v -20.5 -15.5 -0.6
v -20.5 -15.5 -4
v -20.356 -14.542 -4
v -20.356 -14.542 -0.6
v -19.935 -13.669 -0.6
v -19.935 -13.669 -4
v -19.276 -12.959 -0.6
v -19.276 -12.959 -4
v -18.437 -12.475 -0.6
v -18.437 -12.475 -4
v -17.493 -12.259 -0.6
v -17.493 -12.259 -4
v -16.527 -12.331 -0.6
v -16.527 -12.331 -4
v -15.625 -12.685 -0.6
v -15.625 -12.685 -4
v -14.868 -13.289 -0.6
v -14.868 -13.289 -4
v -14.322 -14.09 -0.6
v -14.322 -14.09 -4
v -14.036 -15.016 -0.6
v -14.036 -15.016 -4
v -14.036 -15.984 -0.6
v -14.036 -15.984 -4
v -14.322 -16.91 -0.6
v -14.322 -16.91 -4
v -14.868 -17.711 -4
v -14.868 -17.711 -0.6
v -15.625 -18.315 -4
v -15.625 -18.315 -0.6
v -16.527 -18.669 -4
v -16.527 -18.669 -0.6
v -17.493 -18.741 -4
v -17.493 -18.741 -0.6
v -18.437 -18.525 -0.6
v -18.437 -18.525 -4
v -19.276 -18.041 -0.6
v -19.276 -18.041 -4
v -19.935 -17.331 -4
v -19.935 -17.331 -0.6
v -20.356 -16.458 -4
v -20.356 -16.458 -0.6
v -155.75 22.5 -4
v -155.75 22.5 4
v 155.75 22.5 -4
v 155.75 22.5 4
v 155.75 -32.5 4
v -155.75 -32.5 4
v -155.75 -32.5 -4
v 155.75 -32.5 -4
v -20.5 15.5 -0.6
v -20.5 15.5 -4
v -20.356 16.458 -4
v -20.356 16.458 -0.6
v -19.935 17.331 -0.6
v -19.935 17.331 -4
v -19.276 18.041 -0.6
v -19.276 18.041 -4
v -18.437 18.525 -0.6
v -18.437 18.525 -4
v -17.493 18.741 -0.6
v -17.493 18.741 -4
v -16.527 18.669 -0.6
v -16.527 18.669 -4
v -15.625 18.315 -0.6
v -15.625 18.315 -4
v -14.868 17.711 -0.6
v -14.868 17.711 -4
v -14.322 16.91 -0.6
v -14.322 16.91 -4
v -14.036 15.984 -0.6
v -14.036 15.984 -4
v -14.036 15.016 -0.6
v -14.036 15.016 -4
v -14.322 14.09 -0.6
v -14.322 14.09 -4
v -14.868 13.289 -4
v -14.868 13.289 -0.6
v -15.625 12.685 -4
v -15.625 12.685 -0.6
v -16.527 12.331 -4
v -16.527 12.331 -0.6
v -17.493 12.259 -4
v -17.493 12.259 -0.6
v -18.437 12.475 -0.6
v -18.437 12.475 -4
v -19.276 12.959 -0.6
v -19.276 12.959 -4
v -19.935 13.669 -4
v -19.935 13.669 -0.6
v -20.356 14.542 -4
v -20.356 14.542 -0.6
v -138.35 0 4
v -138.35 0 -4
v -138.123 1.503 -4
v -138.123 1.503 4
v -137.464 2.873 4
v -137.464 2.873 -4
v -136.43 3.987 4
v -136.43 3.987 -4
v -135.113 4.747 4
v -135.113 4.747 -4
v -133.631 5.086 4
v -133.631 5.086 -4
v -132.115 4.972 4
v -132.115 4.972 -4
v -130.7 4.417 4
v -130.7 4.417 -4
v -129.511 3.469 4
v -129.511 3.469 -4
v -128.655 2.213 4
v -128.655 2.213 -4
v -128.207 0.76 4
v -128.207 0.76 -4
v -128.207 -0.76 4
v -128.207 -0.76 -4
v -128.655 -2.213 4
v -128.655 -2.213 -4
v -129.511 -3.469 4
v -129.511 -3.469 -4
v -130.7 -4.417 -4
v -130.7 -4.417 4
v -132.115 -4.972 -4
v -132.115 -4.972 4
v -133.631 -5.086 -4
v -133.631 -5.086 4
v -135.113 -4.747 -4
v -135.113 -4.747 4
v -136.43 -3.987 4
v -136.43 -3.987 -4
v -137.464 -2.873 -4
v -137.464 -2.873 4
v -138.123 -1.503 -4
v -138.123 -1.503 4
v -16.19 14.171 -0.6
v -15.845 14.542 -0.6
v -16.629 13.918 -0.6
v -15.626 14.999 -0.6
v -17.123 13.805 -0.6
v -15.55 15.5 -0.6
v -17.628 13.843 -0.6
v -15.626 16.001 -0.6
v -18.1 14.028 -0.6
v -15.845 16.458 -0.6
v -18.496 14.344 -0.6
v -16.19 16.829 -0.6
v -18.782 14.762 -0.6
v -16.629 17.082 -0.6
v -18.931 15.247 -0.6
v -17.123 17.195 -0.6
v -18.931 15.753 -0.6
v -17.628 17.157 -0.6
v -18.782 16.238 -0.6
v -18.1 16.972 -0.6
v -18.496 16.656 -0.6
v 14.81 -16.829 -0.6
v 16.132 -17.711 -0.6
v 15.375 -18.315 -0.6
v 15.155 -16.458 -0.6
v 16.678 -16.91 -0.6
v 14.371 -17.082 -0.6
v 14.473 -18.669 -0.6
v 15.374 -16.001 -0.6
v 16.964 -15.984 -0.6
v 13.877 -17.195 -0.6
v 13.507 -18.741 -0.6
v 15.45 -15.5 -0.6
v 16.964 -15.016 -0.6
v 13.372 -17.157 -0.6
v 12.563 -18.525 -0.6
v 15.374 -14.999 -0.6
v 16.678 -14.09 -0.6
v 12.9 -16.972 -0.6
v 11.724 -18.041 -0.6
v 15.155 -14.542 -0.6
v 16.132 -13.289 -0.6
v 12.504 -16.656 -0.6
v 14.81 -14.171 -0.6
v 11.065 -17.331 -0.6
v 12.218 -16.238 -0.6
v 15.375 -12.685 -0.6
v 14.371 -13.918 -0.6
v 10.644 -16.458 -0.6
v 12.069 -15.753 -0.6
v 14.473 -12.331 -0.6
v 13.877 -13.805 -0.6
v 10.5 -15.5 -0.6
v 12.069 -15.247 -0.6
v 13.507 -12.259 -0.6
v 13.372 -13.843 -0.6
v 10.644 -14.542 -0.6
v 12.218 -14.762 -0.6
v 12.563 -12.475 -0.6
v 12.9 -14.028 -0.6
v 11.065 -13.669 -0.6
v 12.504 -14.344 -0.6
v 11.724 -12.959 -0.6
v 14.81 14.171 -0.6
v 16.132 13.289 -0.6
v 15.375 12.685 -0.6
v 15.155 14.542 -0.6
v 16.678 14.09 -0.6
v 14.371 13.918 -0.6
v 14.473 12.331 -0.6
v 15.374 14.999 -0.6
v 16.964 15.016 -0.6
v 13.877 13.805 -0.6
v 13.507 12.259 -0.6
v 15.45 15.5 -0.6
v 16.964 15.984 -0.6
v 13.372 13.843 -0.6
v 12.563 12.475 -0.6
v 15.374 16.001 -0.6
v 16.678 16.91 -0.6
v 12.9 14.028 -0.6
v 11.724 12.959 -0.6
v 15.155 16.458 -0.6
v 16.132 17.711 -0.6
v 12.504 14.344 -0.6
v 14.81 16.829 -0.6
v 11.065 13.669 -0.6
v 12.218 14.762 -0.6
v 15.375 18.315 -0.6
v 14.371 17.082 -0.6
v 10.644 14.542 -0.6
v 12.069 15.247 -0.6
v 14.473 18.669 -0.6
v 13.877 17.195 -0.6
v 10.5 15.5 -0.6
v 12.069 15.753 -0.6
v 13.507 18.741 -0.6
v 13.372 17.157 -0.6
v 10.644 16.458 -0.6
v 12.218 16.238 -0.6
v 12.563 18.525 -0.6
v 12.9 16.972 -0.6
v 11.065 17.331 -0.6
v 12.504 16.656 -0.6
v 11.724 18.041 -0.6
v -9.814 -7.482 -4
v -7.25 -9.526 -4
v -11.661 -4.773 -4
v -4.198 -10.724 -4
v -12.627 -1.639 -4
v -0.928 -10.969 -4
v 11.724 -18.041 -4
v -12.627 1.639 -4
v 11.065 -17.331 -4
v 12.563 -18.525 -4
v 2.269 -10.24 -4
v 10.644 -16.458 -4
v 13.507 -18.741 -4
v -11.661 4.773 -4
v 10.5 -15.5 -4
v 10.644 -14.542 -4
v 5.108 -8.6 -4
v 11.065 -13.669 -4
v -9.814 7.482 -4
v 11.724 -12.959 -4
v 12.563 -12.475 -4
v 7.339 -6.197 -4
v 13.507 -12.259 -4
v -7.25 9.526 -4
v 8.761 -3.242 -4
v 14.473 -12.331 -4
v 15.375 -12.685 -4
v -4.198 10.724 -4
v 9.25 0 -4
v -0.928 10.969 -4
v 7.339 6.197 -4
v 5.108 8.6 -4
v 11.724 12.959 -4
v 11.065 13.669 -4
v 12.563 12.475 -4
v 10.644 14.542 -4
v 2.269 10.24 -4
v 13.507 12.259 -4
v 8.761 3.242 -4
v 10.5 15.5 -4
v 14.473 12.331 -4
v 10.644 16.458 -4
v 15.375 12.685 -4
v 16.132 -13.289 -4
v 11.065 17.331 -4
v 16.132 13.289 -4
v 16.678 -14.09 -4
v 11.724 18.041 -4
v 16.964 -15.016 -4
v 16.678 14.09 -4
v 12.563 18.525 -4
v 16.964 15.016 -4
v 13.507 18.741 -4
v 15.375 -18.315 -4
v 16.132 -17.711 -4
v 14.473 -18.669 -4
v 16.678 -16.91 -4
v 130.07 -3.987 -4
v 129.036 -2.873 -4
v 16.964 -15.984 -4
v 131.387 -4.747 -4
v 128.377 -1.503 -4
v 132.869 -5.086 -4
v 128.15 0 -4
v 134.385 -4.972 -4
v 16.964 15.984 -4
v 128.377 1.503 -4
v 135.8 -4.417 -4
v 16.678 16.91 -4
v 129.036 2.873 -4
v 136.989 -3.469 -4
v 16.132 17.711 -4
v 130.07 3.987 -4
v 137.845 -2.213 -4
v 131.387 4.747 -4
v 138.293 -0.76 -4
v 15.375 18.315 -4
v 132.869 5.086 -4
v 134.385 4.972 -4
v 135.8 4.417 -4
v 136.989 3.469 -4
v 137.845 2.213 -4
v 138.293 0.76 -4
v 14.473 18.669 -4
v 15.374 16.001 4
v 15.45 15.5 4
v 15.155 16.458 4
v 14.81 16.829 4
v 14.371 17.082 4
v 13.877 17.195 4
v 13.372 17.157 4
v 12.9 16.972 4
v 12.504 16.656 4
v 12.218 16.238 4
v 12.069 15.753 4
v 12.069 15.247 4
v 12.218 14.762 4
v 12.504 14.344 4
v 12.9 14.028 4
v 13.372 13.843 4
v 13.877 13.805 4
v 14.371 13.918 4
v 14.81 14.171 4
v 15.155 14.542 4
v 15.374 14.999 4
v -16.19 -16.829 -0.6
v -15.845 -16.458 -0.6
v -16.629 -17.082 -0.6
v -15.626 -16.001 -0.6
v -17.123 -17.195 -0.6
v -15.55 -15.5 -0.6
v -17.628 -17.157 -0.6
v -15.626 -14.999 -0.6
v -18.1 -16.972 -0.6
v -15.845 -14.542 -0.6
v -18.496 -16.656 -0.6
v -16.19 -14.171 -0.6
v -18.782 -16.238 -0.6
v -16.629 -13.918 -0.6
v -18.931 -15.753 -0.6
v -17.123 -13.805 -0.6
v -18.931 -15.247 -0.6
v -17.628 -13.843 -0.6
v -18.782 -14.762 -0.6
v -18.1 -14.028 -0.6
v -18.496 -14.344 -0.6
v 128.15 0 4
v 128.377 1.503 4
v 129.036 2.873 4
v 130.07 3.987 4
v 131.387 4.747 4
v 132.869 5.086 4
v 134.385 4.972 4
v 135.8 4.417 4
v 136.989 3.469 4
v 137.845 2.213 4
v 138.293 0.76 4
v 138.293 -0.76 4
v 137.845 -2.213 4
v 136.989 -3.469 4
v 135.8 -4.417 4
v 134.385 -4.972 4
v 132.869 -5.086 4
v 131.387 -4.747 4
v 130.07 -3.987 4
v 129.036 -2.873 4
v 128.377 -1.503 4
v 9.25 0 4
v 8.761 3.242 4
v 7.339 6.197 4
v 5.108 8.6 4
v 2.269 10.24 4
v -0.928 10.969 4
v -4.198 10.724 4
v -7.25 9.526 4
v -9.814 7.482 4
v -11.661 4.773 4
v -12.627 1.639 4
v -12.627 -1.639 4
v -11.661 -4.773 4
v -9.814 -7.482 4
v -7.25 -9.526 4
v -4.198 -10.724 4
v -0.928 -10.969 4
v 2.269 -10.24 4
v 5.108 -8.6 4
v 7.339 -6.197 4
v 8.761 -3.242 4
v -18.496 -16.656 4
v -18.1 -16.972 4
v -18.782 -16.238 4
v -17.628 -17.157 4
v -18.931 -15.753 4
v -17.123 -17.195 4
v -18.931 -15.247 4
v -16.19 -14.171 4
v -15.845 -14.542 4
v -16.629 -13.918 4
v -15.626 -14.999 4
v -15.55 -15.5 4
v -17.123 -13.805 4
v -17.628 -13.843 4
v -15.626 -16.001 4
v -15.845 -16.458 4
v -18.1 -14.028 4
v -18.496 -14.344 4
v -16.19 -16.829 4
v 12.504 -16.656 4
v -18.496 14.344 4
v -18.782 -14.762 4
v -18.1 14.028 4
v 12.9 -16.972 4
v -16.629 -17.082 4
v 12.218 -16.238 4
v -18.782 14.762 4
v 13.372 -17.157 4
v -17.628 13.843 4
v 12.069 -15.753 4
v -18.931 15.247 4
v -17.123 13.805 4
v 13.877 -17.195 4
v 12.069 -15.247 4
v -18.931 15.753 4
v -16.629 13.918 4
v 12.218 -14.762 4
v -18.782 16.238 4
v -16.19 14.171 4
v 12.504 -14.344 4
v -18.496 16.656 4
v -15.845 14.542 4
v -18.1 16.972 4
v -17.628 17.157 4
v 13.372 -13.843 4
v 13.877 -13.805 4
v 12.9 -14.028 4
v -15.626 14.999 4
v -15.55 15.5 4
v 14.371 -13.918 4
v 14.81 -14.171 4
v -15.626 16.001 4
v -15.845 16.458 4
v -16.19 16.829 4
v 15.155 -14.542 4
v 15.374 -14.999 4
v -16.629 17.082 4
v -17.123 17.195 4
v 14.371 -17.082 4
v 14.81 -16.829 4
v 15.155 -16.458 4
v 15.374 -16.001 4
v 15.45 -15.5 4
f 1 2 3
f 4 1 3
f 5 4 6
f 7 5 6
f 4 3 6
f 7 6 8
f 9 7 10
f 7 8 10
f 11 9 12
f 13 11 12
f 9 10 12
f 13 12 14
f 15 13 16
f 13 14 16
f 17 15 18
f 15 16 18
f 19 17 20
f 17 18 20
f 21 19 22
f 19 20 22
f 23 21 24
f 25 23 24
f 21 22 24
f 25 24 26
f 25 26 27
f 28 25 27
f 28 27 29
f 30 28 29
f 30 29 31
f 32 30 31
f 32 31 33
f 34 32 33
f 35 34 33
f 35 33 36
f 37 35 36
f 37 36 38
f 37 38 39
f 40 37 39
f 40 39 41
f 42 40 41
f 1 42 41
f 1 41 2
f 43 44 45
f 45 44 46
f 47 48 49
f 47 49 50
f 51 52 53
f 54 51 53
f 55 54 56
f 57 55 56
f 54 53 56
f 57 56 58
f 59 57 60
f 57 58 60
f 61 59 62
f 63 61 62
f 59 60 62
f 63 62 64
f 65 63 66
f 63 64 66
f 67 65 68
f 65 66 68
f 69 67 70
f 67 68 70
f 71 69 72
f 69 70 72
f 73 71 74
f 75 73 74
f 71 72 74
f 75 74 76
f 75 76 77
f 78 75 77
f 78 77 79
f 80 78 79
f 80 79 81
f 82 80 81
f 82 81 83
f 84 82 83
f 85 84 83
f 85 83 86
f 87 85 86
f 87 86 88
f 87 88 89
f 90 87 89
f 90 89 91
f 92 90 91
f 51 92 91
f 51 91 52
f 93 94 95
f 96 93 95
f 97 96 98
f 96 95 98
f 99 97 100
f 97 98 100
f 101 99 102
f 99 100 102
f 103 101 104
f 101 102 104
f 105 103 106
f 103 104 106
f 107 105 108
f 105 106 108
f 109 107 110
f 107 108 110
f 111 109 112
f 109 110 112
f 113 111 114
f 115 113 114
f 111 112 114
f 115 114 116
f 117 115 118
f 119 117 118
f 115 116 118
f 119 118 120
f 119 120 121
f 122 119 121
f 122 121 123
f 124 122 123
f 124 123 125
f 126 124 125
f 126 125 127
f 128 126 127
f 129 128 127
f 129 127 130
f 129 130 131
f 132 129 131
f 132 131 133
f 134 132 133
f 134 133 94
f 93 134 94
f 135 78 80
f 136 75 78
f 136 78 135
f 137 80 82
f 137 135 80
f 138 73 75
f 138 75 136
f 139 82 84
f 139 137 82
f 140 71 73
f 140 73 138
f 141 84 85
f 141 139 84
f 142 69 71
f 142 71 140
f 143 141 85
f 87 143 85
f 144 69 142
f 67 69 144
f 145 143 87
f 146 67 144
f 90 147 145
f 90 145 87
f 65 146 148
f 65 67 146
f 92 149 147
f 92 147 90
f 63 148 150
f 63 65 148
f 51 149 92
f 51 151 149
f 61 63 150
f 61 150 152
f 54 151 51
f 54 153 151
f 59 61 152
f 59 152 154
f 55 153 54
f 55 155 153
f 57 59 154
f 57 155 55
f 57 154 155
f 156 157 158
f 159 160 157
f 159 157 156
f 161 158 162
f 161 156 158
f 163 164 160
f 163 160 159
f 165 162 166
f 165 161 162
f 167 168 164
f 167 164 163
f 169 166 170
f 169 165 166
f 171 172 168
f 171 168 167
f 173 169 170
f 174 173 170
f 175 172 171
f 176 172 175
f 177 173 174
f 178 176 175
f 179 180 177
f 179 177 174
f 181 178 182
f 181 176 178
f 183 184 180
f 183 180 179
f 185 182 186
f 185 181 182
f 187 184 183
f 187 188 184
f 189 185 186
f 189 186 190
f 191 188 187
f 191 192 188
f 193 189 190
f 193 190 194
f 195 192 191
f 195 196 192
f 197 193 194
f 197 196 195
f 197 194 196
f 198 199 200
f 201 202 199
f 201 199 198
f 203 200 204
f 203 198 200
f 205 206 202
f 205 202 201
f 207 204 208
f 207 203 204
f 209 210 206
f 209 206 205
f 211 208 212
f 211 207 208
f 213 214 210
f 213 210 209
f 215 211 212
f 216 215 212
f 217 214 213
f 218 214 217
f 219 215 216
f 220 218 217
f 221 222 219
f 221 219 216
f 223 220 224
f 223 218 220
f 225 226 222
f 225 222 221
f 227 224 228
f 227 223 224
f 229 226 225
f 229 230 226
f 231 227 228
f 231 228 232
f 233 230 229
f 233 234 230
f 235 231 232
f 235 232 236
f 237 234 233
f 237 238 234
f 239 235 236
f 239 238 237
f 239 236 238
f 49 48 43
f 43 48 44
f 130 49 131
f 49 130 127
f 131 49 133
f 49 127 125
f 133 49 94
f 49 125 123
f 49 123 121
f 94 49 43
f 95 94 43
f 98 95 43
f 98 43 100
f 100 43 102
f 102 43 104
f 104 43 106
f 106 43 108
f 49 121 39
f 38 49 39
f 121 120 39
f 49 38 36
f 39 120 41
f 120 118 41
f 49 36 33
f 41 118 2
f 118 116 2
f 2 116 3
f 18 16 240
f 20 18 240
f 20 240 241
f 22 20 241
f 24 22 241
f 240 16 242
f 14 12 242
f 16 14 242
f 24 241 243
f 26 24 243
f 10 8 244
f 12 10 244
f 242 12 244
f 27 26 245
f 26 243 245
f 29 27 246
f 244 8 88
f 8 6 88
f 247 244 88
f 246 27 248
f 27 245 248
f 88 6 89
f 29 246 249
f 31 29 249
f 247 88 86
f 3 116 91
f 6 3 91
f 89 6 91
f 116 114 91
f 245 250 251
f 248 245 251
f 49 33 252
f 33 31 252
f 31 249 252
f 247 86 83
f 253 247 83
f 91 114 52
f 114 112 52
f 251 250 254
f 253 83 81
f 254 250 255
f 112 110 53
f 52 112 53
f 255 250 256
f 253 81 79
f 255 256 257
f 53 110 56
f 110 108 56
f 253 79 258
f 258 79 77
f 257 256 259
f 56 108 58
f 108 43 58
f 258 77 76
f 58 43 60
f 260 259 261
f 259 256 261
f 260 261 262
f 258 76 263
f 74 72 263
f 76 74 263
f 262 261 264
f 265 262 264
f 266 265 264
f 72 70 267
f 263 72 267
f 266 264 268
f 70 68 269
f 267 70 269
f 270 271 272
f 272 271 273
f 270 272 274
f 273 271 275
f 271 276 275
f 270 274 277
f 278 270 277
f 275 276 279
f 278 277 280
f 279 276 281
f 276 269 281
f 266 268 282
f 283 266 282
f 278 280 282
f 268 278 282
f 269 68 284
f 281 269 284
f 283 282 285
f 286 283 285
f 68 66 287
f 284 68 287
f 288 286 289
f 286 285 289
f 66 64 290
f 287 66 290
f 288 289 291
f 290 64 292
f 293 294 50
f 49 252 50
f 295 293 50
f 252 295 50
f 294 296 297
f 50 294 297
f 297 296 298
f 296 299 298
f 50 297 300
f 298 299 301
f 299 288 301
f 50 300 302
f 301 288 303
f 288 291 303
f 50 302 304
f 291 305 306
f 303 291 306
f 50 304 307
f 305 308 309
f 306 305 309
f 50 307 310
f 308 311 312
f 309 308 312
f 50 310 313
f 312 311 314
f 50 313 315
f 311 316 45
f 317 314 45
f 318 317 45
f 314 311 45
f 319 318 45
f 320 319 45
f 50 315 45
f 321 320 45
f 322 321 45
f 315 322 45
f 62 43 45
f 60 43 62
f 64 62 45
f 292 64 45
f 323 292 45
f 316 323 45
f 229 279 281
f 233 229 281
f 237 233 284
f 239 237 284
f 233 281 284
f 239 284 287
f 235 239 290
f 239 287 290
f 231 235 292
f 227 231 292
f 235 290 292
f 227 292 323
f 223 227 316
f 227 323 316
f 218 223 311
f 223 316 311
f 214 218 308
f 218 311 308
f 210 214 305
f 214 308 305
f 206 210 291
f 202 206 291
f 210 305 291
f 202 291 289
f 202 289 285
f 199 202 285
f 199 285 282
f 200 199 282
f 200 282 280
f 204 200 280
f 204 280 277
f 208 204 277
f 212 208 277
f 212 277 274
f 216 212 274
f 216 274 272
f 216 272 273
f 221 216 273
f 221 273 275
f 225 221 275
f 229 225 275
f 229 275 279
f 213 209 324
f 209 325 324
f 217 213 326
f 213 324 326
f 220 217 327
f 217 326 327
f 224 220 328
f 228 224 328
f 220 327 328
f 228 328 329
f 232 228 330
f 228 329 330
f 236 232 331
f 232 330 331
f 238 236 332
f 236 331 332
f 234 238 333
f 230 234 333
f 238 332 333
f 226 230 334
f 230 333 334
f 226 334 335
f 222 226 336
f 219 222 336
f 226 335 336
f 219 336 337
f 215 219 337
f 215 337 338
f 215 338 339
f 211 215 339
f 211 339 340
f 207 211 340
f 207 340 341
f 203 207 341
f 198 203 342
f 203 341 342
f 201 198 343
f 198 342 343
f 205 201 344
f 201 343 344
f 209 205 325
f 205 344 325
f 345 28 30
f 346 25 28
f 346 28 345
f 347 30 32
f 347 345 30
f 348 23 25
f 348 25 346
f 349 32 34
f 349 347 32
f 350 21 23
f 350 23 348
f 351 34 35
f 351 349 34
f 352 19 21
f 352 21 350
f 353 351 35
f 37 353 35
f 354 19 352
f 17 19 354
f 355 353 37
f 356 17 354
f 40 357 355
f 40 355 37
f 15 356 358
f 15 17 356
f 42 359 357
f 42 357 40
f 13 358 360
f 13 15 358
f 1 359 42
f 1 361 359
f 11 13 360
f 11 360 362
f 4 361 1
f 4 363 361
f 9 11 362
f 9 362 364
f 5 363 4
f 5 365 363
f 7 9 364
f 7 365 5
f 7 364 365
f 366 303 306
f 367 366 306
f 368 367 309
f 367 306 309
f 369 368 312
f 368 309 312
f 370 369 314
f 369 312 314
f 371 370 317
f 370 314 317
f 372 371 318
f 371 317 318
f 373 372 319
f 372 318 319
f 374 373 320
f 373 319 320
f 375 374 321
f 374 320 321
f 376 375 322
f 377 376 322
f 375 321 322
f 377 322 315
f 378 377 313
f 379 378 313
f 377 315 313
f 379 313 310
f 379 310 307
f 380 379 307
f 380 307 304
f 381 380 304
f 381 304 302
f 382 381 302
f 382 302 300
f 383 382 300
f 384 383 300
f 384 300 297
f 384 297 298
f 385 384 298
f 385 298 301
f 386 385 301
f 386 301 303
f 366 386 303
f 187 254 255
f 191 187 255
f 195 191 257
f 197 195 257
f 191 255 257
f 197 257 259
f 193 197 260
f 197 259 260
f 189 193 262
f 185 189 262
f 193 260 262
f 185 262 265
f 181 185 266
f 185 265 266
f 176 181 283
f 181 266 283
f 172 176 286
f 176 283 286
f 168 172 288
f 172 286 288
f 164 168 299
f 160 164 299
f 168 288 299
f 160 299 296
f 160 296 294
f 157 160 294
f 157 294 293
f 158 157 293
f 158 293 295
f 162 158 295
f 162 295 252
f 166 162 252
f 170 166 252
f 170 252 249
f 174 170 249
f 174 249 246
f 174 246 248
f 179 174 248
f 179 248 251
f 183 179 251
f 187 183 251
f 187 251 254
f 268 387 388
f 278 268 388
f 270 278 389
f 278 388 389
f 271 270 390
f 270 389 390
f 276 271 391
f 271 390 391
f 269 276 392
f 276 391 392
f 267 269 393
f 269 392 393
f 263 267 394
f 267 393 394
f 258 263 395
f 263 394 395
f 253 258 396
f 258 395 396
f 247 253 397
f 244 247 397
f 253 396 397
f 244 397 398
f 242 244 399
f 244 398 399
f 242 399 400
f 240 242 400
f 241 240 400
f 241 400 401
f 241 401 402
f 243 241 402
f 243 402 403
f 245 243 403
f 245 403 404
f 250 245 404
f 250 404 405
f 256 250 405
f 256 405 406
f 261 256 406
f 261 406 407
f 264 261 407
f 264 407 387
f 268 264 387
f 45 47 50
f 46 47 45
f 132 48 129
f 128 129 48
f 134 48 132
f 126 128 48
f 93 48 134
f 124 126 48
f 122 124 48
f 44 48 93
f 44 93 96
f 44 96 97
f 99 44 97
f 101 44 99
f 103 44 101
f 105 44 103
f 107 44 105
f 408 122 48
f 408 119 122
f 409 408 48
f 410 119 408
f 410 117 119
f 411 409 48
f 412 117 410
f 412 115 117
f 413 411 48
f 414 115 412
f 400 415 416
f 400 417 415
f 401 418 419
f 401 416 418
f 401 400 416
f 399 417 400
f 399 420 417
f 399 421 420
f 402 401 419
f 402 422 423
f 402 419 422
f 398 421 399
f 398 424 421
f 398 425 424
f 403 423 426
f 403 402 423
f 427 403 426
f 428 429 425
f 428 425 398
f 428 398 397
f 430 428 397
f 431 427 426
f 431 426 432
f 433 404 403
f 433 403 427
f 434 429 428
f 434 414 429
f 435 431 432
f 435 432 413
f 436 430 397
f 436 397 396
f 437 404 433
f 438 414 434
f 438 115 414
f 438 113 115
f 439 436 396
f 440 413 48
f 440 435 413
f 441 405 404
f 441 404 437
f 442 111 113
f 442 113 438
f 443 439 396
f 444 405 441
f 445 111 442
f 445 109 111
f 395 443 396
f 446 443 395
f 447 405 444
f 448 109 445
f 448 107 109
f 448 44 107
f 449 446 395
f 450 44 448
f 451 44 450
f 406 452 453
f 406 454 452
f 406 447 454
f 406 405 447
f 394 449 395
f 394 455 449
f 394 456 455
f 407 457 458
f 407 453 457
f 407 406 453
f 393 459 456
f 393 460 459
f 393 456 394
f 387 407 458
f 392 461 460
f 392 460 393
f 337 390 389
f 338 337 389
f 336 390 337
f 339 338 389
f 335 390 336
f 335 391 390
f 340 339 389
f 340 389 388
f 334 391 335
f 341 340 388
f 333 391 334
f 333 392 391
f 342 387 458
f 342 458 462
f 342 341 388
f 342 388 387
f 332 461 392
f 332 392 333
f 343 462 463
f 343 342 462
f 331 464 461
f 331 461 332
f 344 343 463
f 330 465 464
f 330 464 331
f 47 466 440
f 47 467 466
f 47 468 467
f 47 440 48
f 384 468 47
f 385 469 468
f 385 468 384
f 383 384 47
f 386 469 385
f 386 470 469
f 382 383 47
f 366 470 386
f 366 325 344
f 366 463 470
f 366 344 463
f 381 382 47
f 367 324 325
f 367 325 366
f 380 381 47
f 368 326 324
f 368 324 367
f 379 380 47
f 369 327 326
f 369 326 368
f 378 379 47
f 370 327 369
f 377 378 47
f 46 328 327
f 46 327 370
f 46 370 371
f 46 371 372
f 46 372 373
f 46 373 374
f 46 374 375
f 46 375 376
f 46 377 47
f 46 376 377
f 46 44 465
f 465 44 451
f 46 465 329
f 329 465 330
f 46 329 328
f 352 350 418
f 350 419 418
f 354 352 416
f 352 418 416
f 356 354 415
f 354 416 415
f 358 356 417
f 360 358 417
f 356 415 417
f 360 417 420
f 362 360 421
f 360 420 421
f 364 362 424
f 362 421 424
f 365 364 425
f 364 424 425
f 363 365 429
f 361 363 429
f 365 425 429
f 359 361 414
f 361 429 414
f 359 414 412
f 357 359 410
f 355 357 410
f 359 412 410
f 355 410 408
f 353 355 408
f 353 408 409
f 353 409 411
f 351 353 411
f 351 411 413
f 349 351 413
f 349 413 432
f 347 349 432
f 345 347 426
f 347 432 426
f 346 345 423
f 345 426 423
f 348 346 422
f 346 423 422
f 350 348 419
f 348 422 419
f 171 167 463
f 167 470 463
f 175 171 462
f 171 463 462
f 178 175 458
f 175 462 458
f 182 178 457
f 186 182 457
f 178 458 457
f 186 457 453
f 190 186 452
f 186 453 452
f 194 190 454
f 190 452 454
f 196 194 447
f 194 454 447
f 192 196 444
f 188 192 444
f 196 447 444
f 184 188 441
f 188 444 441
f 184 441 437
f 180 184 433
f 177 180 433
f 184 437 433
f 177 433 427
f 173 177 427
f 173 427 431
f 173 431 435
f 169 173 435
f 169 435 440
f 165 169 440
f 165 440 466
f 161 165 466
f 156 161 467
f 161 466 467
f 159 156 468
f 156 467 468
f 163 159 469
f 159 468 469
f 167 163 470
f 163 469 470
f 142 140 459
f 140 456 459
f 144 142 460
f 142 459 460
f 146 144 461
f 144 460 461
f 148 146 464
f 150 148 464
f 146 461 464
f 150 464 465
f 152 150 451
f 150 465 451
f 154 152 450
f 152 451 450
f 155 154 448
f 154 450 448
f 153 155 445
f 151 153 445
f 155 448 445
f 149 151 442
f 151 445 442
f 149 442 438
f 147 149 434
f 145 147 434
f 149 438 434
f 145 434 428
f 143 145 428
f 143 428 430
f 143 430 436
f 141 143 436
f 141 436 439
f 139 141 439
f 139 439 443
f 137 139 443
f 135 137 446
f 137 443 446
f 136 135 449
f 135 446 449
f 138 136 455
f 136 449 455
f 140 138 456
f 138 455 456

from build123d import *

# Parameters (mm, degrees)
SKETCH1_W                                           = 311.5
SKETCH1_H                                           = 45
BOSS_EXTRUDE1_DEPTH                                 = 4
SKETCH5_R                                           = 11
SKETCH5_R_2                                         = 1.25
CUT_EXTRUDE1_DEPTH                                  = 158.570024116
CBORE_FOR_M3_HEX_SOCKET_HEAD_CAP_SCREW1_D           = 3.4
CBORE_FOR_M3_HEX_SOCKET_HEAD_CAP_SCREW1_CBORE_D     = 6.5
CBORE_FOR_M3_HEX_SOCKET_HEAD_CAP_SCREW1_CBORE_DEPTH = 3.4
F_10_2_10_2_DIAMETER_HOLE1_D                        = 10.2
SKETCH14_W                                          = 311.5
SKETCH14_H                                          = 10
BOSS_EXTRUDE2_DEPTH                                 = 8


with BuildPart() as part:
    # Sketch1 → Boss-Extrude1 (new, symmetric)
    with BuildSketch(Plane.XY):
        Rectangle(SKETCH1_W, SKETCH1_H)
    extrude(amount=BOSS_EXTRUDE1_DEPTH, both=True)

    # Sketch5 → Cut-Extrude1 (cut, through all)
    with BuildSketch(Plane.XY.offset(4)):
        with Locations((-1.75, 0)):
            Circle(SKETCH5_R)
        with Locations((-17.25, 15.5)):
            Circle(SKETCH5_R_2)
        with Locations((13.75, 15.5)):
            Circle(SKETCH5_R_2)
        with Locations((13.75, -15.5)):
            Circle(SKETCH5_R_2)
        with Locations((-17.25, -15.5)):
            Circle(SKETCH5_R_2)
    extrude(amount=-CUT_EXTRUDE1_DEPTH, mode=Mode.SUBTRACT)

    # CBORE for M3 Hex Socket Head Cap Screw1 (through all)
    with Locations(Plane(origin=(0, 0, -4), x_dir=(-1, 0, 0), z_dir=(0, 0, -1))):
        with Locations((-13.75, 15.5), (17.25, 15.5), (17.25, -15.5), (-13.75, -15.5)):
            CounterBoreHole(CBORE_FOR_M3_HEX_SOCKET_HEAD_CAP_SCREW1_D / 2, CBORE_FOR_M3_HEX_SOCKET_HEAD_CAP_SCREW1_CBORE_D / 2, CBORE_FOR_M3_HEX_SOCKET_HEAD_CAP_SCREW1_CBORE_DEPTH)

    # Ø10.2 (10.2) Diameter Hole1 (through all)
    with Locations(Plane.XY.offset(4)):
        with Locations((-133.249958454, 1.369e-06), (133.249998631, 1.369e-06)):
            Hole(F_10_2_10_2_DIAMETER_HOLE1_D / 2)

    # Sketch14 → Boss-Extrude2 (add)
    with BuildSketch(Plane.XY.offset(4)):
        with Locations((0, -27.5)):
            Rectangle(SKETCH14_W, SKETCH14_H)
    extrude(amount=-BOSS_EXTRUDE2_DEPTH)


solid = part.part
